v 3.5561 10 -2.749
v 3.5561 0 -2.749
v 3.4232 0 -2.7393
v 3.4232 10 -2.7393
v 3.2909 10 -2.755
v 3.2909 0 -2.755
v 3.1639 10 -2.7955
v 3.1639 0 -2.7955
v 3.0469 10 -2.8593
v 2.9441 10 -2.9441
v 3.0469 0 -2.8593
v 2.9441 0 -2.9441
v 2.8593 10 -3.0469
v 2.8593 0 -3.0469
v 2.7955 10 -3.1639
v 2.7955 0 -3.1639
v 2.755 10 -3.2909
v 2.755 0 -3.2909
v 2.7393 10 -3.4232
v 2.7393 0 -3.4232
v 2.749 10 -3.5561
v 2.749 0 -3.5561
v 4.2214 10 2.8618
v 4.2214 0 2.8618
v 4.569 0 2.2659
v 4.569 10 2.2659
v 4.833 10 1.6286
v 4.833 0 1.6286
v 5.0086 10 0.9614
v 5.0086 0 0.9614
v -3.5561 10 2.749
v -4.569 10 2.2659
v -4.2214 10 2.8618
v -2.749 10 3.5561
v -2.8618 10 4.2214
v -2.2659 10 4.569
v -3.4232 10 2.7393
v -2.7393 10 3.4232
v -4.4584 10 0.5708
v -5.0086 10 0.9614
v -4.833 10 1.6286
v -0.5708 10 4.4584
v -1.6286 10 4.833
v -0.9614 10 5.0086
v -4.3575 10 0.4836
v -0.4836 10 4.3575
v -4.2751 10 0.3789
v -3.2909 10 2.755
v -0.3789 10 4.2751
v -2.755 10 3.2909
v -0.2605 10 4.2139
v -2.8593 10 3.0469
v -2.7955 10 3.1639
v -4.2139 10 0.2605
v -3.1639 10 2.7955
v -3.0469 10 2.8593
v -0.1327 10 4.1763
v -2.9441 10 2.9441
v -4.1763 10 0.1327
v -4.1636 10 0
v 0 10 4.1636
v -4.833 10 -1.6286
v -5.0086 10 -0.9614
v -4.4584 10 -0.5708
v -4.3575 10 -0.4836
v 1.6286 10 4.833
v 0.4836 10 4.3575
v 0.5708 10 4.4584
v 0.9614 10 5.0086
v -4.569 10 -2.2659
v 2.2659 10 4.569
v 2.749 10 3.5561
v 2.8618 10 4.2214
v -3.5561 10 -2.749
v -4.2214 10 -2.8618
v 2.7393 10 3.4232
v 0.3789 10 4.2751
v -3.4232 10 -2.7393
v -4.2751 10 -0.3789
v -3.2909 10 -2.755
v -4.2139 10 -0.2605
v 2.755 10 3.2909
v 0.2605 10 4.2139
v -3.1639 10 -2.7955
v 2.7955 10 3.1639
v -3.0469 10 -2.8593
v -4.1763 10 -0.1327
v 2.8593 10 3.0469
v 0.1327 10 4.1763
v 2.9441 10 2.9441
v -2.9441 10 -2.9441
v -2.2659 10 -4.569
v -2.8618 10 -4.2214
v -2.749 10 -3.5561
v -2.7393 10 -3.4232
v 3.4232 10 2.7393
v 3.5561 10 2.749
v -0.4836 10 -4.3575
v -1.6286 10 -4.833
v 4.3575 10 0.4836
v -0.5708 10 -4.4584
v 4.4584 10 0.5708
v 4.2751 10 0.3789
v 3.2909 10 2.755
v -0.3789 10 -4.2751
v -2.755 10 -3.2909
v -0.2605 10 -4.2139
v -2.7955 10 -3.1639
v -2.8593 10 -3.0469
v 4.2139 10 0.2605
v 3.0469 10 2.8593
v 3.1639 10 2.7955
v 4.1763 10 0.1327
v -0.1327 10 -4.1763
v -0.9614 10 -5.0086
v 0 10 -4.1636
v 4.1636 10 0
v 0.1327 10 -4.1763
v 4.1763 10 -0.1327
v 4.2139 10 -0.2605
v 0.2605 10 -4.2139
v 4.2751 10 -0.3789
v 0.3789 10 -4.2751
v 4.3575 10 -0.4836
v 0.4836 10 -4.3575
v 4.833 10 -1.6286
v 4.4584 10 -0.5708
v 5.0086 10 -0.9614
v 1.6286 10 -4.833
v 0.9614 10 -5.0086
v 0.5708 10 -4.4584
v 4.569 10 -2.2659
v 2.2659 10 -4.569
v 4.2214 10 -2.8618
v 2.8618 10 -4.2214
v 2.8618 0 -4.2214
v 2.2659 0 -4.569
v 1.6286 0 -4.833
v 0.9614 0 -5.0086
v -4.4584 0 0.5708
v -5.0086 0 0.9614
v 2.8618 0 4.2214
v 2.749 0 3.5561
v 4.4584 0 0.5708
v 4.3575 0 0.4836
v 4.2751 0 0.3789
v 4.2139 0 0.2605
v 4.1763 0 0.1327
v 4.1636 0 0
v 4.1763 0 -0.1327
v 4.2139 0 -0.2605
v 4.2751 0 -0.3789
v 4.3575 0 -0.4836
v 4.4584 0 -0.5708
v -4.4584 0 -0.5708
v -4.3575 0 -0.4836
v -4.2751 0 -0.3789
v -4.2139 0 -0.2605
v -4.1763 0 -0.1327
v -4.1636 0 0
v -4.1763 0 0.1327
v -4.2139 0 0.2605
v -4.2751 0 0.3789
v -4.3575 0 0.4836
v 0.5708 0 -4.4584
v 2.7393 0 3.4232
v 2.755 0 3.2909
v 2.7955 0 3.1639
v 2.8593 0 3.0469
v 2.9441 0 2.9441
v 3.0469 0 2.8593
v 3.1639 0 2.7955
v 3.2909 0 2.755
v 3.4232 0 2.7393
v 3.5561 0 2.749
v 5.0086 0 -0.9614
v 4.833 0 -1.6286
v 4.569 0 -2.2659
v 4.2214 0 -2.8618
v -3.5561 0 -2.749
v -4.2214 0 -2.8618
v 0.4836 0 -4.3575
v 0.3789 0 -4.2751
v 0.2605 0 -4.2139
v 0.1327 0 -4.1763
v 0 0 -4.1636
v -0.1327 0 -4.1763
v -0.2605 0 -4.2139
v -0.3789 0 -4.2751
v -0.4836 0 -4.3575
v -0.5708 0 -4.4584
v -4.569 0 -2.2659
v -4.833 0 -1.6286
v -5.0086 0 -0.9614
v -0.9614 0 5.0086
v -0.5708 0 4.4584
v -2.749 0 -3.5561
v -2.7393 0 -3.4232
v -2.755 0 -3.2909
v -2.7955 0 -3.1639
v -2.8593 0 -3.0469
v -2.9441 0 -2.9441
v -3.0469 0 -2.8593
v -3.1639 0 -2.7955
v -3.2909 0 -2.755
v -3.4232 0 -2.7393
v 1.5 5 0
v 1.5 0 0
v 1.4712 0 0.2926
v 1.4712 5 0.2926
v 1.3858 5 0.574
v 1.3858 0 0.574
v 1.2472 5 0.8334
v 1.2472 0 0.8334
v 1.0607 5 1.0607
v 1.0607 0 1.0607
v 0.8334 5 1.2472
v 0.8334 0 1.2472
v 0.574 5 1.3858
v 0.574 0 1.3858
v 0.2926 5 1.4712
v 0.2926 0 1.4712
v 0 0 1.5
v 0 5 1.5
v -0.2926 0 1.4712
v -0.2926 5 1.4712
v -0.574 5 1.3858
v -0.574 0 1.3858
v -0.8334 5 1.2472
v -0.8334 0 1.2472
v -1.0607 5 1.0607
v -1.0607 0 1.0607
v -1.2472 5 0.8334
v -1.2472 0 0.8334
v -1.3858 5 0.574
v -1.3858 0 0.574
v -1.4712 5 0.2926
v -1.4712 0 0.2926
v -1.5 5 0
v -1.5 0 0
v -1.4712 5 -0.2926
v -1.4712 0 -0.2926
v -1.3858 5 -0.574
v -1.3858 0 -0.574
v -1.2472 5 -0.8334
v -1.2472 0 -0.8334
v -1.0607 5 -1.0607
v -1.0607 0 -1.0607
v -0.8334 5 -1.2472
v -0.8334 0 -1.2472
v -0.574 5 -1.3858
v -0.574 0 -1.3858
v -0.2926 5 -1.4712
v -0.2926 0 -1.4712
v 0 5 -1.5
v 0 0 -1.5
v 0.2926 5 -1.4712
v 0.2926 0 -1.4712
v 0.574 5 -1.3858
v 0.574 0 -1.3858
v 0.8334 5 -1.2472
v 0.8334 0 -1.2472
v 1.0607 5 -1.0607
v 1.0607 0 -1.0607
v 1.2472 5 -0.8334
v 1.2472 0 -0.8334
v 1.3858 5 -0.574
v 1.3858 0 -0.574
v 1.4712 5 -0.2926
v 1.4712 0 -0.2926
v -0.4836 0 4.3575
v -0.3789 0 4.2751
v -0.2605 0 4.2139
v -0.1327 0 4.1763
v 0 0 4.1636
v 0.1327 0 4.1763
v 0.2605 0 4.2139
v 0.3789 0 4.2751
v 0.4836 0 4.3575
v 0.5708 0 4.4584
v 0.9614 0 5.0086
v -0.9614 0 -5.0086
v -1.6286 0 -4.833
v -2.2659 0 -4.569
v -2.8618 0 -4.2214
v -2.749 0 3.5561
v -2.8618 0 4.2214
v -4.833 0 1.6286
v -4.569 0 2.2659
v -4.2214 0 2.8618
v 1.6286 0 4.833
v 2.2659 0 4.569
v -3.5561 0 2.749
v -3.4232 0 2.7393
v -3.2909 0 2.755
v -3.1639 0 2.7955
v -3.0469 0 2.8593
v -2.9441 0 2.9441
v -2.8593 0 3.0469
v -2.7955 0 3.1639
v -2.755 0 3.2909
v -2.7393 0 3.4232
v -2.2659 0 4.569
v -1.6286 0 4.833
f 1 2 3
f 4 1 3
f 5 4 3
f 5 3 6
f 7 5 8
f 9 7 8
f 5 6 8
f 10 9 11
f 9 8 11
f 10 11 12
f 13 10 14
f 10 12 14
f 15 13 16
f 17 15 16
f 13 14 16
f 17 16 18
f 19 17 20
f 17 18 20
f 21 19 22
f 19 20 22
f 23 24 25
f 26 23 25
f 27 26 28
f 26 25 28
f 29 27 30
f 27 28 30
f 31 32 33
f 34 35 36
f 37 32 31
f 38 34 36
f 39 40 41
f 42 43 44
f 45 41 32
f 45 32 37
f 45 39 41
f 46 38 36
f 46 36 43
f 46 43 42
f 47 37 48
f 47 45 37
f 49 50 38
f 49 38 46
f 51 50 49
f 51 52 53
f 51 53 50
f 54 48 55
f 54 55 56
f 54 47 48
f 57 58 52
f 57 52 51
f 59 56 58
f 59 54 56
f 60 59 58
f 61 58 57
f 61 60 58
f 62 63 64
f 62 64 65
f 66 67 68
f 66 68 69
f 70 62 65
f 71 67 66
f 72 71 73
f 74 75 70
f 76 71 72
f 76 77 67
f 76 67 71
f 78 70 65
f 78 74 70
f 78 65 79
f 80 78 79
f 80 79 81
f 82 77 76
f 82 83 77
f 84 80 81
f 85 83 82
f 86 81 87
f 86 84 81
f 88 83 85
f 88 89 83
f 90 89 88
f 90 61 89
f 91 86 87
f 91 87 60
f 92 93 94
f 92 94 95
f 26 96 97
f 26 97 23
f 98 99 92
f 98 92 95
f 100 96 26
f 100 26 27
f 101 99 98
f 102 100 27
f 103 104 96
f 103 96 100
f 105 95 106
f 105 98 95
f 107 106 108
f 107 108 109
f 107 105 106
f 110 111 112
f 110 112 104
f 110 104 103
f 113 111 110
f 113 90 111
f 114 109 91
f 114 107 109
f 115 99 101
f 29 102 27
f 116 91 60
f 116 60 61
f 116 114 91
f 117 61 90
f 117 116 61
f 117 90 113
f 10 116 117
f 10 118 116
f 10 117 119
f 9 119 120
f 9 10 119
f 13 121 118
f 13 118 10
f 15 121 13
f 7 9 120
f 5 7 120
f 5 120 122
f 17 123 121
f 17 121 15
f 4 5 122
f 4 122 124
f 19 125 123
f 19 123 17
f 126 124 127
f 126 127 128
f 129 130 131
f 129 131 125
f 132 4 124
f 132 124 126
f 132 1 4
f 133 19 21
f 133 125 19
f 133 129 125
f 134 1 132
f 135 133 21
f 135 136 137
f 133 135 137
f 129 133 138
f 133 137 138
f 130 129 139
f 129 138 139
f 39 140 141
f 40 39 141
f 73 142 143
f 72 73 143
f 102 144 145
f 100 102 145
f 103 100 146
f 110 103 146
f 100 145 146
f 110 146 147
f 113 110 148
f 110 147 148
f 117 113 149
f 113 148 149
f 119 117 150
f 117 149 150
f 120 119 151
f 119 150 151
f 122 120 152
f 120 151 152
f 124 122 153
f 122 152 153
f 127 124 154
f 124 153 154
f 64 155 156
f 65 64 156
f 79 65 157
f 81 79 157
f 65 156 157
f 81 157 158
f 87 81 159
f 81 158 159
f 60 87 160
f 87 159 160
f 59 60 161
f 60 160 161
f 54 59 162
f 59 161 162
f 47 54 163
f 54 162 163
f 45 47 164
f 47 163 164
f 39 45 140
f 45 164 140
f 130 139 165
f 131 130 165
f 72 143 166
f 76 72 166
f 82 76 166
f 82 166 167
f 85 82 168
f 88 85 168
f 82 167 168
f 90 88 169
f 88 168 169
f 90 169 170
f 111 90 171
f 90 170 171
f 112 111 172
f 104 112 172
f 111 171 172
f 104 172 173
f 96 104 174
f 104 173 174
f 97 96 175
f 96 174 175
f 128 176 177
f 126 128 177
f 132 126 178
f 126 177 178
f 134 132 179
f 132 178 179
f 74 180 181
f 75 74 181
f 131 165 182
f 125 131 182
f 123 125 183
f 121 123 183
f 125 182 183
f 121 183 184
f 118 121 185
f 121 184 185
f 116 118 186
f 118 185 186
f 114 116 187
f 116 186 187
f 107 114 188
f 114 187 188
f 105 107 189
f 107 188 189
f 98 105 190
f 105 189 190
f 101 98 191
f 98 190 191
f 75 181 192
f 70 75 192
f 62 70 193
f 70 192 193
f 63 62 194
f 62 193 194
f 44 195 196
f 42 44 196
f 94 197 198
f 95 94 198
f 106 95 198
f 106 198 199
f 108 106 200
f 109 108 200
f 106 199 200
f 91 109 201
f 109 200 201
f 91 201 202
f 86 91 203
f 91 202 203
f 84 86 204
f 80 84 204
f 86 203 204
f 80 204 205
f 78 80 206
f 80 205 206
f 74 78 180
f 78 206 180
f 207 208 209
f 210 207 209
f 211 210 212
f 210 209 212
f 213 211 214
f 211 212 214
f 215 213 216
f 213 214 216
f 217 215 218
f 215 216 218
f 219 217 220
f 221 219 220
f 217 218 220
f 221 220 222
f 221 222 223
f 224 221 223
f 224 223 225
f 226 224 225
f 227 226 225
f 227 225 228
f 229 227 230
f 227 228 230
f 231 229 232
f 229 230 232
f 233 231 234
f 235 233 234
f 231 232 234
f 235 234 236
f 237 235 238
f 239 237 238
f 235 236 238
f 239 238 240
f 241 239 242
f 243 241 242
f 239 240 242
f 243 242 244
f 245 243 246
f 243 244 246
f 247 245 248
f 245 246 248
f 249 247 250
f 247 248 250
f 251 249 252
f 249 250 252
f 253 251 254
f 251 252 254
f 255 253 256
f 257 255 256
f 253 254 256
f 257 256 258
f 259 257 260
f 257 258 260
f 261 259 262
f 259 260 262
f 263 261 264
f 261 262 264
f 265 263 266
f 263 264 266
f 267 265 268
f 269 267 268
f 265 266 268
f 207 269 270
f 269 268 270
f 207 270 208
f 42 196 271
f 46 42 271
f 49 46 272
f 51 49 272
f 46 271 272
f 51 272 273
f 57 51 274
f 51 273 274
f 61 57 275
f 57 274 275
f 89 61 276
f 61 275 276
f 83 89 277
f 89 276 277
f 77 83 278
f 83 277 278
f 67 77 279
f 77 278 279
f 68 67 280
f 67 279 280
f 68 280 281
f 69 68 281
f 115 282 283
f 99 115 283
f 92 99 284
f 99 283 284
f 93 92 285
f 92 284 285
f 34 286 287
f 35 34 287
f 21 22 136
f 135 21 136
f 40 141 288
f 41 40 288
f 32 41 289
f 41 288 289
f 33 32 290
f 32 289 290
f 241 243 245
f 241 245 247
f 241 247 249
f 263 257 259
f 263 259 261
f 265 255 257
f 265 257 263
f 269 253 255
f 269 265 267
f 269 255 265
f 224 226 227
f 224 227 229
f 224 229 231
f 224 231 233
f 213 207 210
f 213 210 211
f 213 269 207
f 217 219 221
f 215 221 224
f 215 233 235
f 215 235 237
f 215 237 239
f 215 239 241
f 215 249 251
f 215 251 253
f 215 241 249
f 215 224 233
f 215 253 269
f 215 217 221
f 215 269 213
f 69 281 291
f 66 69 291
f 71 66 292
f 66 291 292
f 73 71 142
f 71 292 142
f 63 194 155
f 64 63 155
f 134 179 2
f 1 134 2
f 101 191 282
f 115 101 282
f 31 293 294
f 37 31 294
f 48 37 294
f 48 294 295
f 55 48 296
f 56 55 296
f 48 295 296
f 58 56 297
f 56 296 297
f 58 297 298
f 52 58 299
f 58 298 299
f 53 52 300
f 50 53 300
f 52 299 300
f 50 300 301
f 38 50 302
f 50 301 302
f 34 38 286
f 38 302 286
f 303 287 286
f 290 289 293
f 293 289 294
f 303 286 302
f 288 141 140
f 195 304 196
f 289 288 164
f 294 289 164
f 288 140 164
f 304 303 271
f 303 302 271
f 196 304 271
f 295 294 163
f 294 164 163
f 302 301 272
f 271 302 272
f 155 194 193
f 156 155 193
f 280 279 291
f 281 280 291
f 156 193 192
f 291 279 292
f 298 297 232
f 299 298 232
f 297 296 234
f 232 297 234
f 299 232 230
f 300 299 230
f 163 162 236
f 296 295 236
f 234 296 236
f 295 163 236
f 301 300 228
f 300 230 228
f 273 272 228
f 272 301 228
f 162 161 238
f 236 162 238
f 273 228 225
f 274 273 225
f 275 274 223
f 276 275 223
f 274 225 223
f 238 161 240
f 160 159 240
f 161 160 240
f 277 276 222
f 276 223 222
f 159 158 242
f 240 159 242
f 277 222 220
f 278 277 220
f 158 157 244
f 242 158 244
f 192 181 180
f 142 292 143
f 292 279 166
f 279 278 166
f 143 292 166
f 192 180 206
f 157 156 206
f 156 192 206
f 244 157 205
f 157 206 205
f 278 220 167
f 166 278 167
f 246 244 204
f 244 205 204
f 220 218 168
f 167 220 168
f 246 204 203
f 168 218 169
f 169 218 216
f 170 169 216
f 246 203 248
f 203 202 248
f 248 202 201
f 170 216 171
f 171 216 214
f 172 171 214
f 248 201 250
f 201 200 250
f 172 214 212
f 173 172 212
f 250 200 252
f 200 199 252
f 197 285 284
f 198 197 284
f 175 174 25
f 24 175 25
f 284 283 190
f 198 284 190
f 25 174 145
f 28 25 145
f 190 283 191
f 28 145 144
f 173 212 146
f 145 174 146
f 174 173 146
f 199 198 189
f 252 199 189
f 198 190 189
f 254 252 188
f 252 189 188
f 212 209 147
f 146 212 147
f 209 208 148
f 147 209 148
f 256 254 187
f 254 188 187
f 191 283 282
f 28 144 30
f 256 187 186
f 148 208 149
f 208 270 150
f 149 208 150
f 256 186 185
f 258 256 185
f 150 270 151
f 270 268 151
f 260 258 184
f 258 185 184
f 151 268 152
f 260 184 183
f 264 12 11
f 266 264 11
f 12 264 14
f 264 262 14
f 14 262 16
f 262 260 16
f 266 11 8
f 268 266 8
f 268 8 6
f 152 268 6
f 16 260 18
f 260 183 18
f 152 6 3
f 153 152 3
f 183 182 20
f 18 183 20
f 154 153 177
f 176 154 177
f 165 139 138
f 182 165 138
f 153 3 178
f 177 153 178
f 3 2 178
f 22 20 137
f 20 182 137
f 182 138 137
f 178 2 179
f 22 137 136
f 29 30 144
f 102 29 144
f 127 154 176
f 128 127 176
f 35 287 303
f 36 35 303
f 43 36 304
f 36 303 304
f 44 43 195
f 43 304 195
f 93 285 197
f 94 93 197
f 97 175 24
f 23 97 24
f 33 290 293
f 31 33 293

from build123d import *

# Parameters (mm, degrees)
BOSS_EXTRUDE1_DEPTH = 10
SKETCH2_R           = 1.5
CUT_EXTRUDE1_DEPTH  = 5


with BuildPart() as part:
    # Sketch1 → Boss-Extrude1 (new body)
    with BuildSketch(Plane(origin=(0, 0, 0), x_dir=(1, 0, 0), z_dir=(0, 1, 0))):
        with BuildLine():
            Line((-0.570751275, 4.458354836), (-0.96142982, 5.008557946))
            ThreePointArc((-0.96142982, 5.008557946), (-1.951685505, 4.711785616), (-2.861751742, 4.221418833))
            Line((-2.861751742, 4.221418833), (-2.748950841, 3.556115034))
            ThreePointArc((-2.748950841, 3.556115034), (-2.944126667, 2.944126667), (-3.556115034, 2.748950841))
            Line((-3.556115034, 2.748950841), (-4.221418833, 2.861751742))
            ThreePointArc((-4.221418833, 2.861751742), (-4.711785616, 1.951685505), (-5.008557946, 0.96142982))
            Line((-5.008557946, 0.96142982), (-4.458354836, 0.570751275))
            ThreePointArc((-4.458354836, 0.570751275), (-4.163623861, 0), (-4.458354836, -0.570751275))
            Line((-4.458354836, -0.570751275), (-5.008557946, -0.96142982))
            ThreePointArc((-5.008557946, -0.96142982), (-4.711785616, -1.951685505), (-4.221418833, -2.861751742))
            Line((-4.221418833, -2.861751742), (-3.556115034, -2.748950841))
            ThreePointArc((-3.556115034, -2.748950841), (-2.944126667, -2.944126667), (-2.748950841, -3.556115034))
            Line((-2.748950841, -3.556115034), (-2.861751742, -4.221418833))
            ThreePointArc((-2.861751742, -4.221418833), (-1.951685505, -4.711785616), (-0.96142982, -5.008557946))
            Line((-0.96142982, -5.008557946), (-0.570751275, -4.458354836))
            ThreePointArc((-0.570751275, -4.458354836), (0, -4.163623861), (0.570751275, -4.458354836))
            Line((0.570751275, -4.458354836), (0.96142982, -5.008557946))
            ThreePointArc((0.96142982, -5.008557946), (1.951685505, -4.711785616), (2.861751742, -4.221418833))
            Line((2.861751742, -4.221418833), (2.748950841, -3.556115034))
            ThreePointArc((2.748950841, -3.556115034), (2.944126667, -2.944126667), (3.556115034, -2.748950841))
            Line((3.556115034, -2.748950841), (4.221418833, -2.861751742))
            ThreePointArc((4.221418833, -2.861751742), (4.711785616, -1.951685505), (5.008557946, -0.96142982))
            Line((5.008557946, -0.96142982), (4.458354836, -0.570751275))
            ThreePointArc((4.458354836, -0.570751275), (4.163623861, 0), (4.458354836, 0.570751275))
            Line((4.458354836, 0.570751275), (5.008557946, 0.96142982))
            ThreePointArc((5.008557946, 0.96142982), (4.711785616, 1.951685505), (4.221418833, 2.861751742))
            Line((4.221418833, 2.861751742), (3.556115034, 2.748950841))
            ThreePointArc((3.556115034, 2.748950841), (2.944126667, 2.944126667), (2.748950841, 3.556115034))
            Line((2.748950841, 3.556115034), (2.861751742, 4.221418833))
            ThreePointArc((2.861751742, 4.221418833), (1.951685505, 4.711785616), (0.96142982, 5.008557946))
            Line((0.96142982, 5.008557946), (0.570751275, 4.458354836))
            ThreePointArc((0.570751275, 4.458354836), (0, 4.163623861), (-0.570751275, 4.458354836))
        make_face()
    extrude(amount=BOSS_EXTRUDE1_DEPTH)

    # Sketch2 → Cut-Extrude1 (cut)
    with BuildSketch(Plane.XZ):
        Circle(SKETCH2_R)
    extrude(amount=-CUT_EXTRUDE1_DEPTH, mode=Mode.SUBTRACT)


solid = part.part
